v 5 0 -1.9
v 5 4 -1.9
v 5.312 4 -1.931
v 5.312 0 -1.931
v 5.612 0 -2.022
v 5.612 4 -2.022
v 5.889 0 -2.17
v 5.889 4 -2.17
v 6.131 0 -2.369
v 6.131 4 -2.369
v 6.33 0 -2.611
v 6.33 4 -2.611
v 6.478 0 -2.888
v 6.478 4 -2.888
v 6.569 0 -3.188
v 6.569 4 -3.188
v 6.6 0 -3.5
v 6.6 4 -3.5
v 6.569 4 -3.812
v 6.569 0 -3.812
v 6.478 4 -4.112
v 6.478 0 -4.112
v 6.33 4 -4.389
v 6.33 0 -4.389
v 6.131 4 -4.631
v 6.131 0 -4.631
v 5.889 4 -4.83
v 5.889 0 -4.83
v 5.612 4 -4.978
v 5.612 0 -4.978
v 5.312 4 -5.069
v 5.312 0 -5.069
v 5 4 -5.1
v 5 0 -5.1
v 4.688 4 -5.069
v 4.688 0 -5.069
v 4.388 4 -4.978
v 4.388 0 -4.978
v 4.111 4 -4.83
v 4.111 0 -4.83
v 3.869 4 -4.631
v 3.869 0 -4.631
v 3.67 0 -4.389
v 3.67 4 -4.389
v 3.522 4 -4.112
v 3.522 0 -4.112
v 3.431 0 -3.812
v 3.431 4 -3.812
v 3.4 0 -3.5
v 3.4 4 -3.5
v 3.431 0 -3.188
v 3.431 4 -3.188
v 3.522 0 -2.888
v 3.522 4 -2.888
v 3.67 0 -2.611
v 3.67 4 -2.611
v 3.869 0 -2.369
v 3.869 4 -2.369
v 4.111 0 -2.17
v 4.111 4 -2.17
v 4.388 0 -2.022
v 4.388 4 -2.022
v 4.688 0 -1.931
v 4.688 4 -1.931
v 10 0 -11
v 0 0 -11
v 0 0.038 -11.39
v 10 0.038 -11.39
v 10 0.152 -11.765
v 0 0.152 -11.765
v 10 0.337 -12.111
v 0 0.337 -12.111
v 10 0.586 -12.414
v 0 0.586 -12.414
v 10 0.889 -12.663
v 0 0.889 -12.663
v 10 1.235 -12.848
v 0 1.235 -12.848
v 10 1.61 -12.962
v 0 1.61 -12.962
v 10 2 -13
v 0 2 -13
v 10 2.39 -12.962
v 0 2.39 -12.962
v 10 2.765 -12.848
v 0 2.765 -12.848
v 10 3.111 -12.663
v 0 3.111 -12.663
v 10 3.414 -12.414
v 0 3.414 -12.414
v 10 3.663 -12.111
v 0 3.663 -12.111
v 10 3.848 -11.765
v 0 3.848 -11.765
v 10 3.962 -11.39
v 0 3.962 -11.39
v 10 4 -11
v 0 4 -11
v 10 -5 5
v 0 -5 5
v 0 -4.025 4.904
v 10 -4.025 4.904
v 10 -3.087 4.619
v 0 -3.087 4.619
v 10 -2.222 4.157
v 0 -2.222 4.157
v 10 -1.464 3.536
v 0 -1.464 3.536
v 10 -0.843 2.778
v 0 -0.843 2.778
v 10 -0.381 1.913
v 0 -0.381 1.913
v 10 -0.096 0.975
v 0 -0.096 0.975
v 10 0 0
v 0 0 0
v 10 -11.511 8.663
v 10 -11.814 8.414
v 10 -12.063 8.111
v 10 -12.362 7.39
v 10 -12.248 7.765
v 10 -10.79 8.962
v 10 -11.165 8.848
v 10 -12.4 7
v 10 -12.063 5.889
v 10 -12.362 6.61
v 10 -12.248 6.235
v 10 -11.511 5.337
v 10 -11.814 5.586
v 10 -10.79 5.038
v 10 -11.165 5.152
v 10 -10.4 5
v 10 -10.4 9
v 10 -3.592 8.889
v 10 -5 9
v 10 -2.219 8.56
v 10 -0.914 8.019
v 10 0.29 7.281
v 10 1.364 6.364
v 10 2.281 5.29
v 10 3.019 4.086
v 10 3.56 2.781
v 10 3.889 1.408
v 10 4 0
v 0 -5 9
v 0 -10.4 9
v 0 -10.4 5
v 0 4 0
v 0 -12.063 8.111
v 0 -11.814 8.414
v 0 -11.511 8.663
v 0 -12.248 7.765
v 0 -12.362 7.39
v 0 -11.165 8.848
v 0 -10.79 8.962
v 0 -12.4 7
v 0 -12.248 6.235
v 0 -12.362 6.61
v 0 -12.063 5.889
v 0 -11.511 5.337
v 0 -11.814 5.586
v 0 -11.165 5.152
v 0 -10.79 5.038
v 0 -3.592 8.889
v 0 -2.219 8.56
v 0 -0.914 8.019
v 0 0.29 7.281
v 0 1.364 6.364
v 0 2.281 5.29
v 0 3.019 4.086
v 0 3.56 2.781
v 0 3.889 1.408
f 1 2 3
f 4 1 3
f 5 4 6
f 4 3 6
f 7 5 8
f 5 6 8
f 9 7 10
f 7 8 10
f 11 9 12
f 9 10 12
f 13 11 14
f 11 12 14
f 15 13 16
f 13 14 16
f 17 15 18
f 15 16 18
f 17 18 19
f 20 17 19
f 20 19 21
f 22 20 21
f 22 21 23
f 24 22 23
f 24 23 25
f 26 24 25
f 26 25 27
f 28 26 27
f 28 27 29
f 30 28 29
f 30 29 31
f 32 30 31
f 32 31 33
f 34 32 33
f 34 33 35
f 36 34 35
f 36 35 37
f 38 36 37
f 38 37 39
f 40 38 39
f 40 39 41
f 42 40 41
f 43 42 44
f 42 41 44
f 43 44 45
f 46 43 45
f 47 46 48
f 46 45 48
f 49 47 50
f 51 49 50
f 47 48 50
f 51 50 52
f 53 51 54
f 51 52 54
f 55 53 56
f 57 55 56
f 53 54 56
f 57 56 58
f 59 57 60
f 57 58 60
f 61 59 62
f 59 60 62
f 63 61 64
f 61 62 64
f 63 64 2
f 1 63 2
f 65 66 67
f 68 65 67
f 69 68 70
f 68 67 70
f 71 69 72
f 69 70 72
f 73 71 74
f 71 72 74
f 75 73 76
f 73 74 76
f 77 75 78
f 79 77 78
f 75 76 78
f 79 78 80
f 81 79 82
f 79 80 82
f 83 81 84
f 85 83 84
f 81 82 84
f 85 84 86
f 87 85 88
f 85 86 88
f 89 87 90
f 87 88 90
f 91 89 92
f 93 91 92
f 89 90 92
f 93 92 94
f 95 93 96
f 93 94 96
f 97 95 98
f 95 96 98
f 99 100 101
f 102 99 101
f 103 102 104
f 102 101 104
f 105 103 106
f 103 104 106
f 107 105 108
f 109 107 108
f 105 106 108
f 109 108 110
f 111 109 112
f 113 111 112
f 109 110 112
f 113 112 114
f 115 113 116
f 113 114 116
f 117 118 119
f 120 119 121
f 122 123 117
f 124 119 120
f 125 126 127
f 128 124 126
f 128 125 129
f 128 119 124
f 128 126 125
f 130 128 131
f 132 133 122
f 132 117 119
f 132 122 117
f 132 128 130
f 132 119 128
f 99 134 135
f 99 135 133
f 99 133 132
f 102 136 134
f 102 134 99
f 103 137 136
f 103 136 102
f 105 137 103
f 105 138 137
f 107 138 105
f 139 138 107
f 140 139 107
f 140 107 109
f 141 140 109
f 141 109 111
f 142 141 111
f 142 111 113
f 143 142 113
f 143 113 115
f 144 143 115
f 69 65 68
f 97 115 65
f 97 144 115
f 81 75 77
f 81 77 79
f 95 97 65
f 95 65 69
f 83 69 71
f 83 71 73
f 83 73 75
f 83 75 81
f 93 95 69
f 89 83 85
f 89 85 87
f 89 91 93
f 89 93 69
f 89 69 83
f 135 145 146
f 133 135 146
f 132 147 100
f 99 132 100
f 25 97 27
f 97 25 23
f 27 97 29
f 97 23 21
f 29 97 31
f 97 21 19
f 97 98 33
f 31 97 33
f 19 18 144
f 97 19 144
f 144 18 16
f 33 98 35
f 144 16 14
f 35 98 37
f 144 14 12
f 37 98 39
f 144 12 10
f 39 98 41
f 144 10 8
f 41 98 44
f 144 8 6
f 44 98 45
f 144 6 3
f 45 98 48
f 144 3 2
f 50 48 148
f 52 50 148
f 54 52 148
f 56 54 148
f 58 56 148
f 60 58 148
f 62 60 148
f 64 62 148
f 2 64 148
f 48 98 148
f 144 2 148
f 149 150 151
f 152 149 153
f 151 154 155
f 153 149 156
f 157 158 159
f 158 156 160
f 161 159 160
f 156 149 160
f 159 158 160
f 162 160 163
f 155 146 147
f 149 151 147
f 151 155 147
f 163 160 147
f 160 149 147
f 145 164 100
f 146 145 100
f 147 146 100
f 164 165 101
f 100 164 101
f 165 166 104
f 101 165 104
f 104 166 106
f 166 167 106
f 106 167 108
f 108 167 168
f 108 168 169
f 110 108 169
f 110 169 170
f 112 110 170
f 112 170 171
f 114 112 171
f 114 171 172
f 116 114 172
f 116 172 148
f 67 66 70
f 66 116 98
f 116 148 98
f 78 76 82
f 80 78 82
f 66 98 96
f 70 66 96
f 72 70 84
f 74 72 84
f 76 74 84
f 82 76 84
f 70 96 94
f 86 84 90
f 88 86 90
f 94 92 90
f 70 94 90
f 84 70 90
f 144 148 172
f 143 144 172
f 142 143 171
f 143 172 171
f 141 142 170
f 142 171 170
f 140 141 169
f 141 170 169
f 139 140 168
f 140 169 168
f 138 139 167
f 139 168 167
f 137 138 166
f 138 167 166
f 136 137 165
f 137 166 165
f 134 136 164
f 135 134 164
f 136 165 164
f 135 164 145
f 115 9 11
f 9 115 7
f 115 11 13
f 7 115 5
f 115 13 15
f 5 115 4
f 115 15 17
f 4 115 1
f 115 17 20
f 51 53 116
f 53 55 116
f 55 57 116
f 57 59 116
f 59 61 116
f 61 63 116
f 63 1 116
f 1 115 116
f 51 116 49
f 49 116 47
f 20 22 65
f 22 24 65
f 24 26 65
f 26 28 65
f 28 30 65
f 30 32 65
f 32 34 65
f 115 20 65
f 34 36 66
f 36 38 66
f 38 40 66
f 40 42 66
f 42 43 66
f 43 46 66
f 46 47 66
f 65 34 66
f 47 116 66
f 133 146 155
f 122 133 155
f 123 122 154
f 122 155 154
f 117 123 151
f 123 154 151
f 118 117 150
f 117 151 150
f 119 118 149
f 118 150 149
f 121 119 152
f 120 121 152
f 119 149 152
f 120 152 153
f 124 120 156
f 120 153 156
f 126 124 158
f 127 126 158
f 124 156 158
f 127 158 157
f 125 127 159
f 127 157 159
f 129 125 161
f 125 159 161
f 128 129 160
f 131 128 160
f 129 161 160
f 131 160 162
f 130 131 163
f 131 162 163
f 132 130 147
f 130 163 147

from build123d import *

# Parameters (mm, degrees)
BOSS_EXTRUDE1_DEPTH = 10
SKETCH2_R           = 1.6
CUT_EXTRUDE1_DEPTH  = 10


with BuildPart() as part:
    # Sketch1 → Boss-Extrude1 (new body)
    with BuildSketch(Plane(origin=(0, 0, 0), x_dir=(0, 0, -1), z_dir=(1, 0, 0))):
        with BuildLine():
            Line((0, 0), (11, 0))
            ThreePointArc((11, 0), (13, 2), (11, 4))
            Line((11, 4), (0, 4))
            ThreePointArc((0, 4), (-6.363961031, 1.363961031), (-9, -5))
            Line((-9, -5), (-9, -10.4))
            ThreePointArc((-9, -10.4), (-7, -12.4), (-5, -10.4))
            Line((-5, -10.4), (-5, -5))
            ThreePointArc((-5, -5), (-3.535533906, -1.464466094), (0, 0))
        make_face()
    extrude(amount=BOSS_EXTRUDE1_DEPTH)

    # Sketch2 → Cut-Extrude1 (cut)
    with BuildSketch(Plane(origin=(0, 4, 0), x_dir=(1, 0, 0), z_dir=(0, 1, 0))):
        with Locations(Location((5, 3.5, 0), (0, 0, 270))):  # turned: the seam where the file's is
            Circle(SKETCH2_R)
    extrude(amount=-CUT_EXTRUDE1_DEPTH, mode=Mode.SUBTRACT)


solid = part.part
